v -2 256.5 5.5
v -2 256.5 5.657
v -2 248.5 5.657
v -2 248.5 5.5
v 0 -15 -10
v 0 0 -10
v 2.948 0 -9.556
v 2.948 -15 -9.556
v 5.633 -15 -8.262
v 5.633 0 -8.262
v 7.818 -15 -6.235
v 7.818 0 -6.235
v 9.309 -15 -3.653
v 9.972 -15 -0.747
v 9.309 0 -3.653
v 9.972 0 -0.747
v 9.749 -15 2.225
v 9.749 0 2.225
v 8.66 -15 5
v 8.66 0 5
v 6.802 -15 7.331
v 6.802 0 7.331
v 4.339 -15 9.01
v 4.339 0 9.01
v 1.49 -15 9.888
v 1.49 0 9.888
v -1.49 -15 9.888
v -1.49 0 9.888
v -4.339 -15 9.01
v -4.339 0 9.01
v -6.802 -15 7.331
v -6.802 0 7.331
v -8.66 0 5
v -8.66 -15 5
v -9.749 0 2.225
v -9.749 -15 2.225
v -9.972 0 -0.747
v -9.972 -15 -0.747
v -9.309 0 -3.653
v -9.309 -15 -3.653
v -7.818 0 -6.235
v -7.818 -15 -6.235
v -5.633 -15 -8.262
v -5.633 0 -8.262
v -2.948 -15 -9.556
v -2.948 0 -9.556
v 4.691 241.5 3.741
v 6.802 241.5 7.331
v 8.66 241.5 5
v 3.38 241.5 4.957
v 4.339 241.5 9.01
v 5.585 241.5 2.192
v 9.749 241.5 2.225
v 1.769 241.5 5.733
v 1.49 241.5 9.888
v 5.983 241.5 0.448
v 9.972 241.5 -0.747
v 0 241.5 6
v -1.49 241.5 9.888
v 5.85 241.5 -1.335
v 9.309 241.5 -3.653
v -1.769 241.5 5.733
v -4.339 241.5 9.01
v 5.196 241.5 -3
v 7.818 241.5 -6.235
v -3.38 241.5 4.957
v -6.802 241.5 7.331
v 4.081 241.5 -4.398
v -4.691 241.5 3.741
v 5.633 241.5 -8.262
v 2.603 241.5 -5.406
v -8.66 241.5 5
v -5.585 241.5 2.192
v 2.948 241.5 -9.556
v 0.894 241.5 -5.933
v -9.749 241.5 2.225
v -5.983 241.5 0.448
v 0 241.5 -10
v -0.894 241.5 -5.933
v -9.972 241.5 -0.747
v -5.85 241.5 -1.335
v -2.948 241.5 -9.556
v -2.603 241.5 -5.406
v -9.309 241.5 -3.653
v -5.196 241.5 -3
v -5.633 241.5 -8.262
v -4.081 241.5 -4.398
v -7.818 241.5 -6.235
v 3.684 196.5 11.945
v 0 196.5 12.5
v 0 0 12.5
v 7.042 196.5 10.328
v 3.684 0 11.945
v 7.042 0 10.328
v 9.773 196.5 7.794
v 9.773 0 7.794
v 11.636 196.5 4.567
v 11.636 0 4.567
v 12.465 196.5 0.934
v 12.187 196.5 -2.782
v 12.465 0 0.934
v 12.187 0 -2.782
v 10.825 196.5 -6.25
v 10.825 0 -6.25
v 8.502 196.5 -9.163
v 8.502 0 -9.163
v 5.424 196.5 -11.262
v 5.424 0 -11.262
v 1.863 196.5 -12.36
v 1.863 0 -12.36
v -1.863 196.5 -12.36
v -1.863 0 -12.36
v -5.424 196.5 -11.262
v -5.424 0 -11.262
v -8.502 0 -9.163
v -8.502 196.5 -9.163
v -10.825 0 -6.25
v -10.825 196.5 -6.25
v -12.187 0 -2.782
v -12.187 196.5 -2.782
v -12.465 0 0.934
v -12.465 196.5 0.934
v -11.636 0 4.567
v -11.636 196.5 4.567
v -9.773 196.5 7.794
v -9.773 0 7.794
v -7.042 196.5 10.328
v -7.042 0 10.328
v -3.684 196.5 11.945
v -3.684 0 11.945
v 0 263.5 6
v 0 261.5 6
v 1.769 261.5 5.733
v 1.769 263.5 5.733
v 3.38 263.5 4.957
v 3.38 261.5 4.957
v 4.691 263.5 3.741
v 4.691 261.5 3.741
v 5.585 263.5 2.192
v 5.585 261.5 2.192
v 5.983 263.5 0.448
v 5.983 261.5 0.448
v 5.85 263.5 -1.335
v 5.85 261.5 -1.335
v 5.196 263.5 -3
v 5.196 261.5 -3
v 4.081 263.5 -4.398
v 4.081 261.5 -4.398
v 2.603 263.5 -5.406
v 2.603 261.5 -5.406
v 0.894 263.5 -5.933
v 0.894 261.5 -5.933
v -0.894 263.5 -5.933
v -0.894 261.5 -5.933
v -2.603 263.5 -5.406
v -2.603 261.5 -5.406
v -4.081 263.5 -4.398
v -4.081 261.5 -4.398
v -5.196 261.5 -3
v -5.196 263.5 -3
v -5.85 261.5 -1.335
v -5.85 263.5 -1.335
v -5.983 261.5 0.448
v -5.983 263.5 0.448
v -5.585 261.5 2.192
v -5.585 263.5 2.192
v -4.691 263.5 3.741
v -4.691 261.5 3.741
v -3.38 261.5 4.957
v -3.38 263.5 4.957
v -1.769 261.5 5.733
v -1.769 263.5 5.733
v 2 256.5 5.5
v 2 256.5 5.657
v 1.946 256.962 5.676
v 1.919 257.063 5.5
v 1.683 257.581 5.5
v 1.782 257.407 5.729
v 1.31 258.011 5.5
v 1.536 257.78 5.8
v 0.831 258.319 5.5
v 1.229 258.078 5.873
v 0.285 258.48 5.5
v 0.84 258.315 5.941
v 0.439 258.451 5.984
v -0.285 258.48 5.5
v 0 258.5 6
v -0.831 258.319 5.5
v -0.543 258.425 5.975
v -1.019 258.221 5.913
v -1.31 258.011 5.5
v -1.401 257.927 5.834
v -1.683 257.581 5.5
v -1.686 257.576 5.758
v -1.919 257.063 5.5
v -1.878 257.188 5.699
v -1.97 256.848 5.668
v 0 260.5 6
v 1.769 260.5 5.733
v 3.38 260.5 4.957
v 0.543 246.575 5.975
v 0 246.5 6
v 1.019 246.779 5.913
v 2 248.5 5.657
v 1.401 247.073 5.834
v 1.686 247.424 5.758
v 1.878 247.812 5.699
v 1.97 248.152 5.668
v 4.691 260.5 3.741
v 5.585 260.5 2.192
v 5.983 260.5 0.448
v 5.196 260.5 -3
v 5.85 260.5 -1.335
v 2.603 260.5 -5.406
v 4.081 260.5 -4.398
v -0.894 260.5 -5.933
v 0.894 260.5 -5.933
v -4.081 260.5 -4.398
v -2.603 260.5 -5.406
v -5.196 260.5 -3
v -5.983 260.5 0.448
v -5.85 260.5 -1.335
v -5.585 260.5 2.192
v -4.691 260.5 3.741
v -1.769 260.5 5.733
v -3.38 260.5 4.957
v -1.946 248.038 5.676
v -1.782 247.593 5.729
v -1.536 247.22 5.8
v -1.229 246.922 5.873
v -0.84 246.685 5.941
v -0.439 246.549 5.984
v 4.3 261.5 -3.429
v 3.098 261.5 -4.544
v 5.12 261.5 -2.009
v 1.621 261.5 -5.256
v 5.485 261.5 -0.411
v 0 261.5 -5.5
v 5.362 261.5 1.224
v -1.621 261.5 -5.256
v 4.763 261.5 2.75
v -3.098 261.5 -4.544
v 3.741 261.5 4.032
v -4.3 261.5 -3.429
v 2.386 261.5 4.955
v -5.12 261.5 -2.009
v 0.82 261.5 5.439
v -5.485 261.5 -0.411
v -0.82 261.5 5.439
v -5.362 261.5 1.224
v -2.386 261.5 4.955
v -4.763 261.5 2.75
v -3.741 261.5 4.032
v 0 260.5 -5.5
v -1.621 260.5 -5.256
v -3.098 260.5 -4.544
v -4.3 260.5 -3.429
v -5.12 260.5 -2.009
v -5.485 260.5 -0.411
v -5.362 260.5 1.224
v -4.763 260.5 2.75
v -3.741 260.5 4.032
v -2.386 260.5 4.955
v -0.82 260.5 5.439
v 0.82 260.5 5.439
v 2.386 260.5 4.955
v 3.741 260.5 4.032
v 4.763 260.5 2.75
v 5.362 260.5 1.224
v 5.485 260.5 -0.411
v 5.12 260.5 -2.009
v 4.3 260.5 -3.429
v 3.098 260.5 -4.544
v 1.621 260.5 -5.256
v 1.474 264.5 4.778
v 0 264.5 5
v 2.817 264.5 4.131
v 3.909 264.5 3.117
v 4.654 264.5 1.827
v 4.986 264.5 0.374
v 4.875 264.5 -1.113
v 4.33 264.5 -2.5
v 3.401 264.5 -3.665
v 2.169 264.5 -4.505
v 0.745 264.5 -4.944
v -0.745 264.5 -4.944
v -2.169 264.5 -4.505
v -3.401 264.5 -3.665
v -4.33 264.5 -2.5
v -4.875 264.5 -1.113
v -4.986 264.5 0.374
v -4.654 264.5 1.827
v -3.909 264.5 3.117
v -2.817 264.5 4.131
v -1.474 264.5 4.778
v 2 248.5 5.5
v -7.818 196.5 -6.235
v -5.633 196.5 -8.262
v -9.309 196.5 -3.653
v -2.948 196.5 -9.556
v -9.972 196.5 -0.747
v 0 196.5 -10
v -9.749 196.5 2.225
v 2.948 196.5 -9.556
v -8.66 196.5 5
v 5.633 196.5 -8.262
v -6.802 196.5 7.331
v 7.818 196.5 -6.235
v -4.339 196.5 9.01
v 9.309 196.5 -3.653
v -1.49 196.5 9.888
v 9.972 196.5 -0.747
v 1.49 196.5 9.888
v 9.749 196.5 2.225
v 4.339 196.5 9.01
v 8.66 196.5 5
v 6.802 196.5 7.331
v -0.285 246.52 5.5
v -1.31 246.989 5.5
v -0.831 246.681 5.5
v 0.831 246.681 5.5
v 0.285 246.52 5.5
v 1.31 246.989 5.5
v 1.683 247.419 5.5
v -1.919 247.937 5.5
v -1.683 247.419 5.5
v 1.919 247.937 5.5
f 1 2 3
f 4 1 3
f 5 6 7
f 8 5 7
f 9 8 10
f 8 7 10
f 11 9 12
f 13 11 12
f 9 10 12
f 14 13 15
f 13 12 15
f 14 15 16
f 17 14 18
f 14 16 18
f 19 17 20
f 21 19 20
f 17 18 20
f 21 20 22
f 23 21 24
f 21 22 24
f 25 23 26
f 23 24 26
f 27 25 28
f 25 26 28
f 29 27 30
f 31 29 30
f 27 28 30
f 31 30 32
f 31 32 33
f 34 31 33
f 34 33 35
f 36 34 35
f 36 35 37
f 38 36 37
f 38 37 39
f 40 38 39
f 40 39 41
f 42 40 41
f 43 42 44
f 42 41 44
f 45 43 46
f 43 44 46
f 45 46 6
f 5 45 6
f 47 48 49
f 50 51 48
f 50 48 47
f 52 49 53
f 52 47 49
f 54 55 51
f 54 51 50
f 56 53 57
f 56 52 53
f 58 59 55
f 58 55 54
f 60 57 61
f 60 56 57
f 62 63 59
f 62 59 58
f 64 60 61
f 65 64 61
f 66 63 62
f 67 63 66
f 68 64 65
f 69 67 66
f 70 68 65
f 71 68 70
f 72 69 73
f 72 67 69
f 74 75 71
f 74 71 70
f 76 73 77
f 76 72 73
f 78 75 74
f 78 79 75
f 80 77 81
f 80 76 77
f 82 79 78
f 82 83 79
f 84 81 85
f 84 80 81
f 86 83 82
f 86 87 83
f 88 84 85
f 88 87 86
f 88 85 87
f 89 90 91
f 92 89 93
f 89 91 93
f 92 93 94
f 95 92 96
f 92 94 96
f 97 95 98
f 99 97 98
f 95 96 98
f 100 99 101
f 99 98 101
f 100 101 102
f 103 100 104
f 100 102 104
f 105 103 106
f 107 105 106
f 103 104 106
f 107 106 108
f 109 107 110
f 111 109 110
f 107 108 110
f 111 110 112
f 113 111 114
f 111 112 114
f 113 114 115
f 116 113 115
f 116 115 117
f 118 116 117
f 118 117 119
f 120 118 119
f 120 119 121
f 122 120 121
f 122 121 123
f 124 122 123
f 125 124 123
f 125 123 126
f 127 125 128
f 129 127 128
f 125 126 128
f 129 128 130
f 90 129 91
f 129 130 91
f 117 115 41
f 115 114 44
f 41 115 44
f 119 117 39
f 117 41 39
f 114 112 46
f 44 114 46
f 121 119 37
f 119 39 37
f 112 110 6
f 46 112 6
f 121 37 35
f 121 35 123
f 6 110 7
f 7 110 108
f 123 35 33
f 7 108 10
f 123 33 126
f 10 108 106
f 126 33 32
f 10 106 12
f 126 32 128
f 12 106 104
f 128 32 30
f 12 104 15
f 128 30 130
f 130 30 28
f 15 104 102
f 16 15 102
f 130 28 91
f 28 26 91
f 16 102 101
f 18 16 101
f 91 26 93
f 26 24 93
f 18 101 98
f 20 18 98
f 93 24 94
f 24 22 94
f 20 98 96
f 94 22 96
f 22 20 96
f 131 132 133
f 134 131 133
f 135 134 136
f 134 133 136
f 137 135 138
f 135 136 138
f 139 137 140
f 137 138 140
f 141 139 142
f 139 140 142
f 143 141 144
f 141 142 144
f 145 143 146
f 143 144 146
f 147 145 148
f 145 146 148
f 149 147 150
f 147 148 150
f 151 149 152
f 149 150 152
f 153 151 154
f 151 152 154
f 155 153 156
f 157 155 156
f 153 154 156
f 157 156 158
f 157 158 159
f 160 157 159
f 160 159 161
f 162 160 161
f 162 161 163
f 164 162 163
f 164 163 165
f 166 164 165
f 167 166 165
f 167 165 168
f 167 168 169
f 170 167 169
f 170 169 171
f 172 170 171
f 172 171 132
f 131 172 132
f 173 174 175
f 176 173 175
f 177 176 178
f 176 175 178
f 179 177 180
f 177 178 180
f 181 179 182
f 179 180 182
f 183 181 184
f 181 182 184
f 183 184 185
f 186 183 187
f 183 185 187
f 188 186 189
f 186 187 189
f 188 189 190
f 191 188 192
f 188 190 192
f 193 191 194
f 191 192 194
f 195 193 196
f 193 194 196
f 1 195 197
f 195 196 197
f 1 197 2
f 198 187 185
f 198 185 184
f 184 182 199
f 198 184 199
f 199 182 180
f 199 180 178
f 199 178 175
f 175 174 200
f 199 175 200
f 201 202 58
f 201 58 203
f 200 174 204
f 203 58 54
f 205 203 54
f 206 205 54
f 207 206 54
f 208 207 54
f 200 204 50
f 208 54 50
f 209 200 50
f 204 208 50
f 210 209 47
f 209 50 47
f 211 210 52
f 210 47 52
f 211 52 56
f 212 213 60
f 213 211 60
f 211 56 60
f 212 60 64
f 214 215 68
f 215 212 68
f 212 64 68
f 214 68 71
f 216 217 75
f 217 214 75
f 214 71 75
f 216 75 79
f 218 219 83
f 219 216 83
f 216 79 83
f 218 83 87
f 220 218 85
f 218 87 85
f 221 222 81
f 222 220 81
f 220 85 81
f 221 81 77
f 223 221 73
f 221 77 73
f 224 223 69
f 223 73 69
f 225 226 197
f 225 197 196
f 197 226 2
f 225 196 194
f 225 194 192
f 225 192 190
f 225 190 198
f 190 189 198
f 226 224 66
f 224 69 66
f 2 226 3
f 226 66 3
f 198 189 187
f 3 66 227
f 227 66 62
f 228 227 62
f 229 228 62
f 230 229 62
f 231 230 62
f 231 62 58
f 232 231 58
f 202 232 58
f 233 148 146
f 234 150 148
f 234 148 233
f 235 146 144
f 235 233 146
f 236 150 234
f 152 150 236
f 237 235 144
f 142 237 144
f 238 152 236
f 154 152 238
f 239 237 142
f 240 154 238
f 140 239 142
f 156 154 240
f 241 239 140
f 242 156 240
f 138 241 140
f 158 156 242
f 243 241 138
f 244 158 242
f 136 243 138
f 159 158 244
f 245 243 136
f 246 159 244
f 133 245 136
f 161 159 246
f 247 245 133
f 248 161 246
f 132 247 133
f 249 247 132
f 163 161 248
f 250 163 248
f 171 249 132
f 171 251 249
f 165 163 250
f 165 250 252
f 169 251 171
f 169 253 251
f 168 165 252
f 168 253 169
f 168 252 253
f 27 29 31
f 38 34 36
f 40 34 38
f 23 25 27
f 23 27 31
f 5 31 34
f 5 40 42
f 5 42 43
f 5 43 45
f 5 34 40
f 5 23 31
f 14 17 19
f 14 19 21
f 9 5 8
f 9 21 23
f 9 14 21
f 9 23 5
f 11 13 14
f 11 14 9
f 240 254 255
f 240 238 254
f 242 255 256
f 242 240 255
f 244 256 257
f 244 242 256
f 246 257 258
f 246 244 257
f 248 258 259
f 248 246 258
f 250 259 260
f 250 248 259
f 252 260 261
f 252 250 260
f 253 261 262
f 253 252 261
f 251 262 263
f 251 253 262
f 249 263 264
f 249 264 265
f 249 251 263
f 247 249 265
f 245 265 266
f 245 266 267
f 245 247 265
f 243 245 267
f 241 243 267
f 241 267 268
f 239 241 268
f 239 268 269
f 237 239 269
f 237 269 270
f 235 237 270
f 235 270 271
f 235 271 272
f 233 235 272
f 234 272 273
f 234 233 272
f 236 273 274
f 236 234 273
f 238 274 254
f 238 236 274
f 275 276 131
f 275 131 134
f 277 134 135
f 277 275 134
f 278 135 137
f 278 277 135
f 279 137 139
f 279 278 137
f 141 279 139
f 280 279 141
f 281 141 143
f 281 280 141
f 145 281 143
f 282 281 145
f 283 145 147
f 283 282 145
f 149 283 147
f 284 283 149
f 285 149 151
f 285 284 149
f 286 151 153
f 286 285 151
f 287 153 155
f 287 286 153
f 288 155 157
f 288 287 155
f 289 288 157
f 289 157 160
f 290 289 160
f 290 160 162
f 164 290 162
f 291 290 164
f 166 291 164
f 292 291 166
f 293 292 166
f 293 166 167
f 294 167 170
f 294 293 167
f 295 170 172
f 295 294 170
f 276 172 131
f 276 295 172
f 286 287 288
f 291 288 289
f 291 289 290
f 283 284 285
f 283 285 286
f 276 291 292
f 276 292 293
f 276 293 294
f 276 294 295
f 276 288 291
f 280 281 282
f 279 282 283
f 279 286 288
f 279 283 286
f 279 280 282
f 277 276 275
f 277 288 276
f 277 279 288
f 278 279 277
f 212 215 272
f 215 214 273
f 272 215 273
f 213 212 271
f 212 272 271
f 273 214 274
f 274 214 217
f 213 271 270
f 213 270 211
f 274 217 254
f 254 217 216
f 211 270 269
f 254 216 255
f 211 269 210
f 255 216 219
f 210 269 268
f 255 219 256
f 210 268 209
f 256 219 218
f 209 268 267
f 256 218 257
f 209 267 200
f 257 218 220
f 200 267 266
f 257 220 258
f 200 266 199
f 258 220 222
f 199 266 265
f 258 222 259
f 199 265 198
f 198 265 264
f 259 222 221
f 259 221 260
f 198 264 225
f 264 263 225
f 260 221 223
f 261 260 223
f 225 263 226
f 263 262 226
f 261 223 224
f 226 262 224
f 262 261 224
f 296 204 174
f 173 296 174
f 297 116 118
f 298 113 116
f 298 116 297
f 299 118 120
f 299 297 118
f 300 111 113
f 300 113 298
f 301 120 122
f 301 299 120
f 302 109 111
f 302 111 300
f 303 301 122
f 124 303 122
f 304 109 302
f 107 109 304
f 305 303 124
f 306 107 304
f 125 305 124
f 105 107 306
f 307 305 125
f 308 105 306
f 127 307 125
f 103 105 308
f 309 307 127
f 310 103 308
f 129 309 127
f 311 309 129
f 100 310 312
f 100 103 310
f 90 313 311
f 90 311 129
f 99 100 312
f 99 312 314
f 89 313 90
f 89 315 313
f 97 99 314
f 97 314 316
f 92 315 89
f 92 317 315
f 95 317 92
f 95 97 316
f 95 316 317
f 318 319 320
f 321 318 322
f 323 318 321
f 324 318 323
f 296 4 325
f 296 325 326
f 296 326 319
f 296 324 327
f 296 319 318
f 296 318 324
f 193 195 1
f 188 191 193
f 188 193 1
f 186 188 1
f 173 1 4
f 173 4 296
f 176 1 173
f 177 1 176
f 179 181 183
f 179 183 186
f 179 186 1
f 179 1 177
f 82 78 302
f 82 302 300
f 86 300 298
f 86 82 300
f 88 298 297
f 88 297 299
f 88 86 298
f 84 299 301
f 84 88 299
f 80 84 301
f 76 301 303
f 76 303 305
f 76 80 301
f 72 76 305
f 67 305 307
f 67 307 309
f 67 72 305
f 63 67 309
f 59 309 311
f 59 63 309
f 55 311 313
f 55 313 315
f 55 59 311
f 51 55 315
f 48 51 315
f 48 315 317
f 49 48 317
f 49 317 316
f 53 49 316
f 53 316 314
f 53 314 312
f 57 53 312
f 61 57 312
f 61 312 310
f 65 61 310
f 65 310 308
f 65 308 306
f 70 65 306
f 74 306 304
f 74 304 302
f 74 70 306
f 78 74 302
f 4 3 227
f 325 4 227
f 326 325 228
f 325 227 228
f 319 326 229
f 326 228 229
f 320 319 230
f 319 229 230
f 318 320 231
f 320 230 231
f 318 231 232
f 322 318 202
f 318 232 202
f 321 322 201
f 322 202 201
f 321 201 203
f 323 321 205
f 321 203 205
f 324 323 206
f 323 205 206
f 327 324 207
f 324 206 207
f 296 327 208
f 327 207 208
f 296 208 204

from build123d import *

# Parameters (mm, degrees)
SKETCH_1_R          = 12.5
EXTRUDE_1_DEPTH     = 196.5
SKETCH_2_R          = 10
EXTRUDE_2_DEPTH     = 15
EXTRUDE_START       = 45
SKETCH_3_R          = 10
EXTRUDE_3_DEPTH     = 45
SKETCH_4_R          = 6
EXTRUDE_4_DEPTH     = 23
CUT_EXTRUDE_1_DEPTH = 4
CHAMFER_1_SIZE      = 1
SKETCH_6_W          = 0.5
SKETCH_6_H          = 1


with BuildPart() as part:
    # 草图1 → 凸台-拉伸1 (new body)
    with BuildSketch(Plane(origin=(0, 0, 0), x_dir=(1, 0, 0), z_dir=(0, 1, 0))):
        with Locations(Location((0, 0, 0), (0, 0, 270))):
            Circle(SKETCH_1_R)
    extrude(amount=EXTRUDE_1_DEPTH)

    # 草图2 → 凸台-拉伸2 (add)
    with BuildSketch(Plane.XZ):
        with Locations(Location((0, 0, 0), (0, 0, 270))):
            Circle(SKETCH_2_R)
    extrude(amount=EXTRUDE_2_DEPTH)

    # 草图3 → 凸台-拉伸3 (add)
    with BuildSketch(Plane(origin=(0, 196.5, 0), x_dir=(1, 0, 0), z_dir=(0, 1, 0)).offset(EXTRUDE_START)):
        with Locations(Location((0, 0, 0), (0, 0, 90))):
            Circle(SKETCH_3_R)
    extrude(amount=-EXTRUDE_3_DEPTH)

    # 草图4 → 凸台-拉伸4 (add)
    with BuildSketch(Plane(origin=(0, 241.5, 0), x_dir=(1, 0, 0), z_dir=(0, 1, 0))):
        with Locations(Location((0, 0, 0), (0, 0, 270))):
            Circle(SKETCH_4_R)
    extrude(amount=EXTRUDE_4_DEPTH)

    # 草图5 → 切除-拉伸1 (cut)
    with BuildSketch(Plane(origin=(0, 0, 9.5), x_dir=(-1, 0, 0), z_dir=(0, 0, -1))):
        with BuildLine():
            Line((2, 256.5), (2, 248.5))
            ThreePointArc((2, 248.5), (0, 246.5), (-2, 248.5))
            Line((-2, 248.5), (-2, 256.5))
            ThreePointArc((-2, 256.5), (0, 258.5), (2, 256.5))
        make_face()
    extrude(amount=CUT_EXTRUDE_1_DEPTH, mode=Mode.SUBTRACT)

    # 倒角1
    chamfer_1_edges = [part.edges().sort_by_distance(p)[0] for p in [
        (0, 264.5, -6),
    ]]
    chamfer(chamfer_1_edges, length=CHAMFER_1_SIZE)

    # 草图6 → 切除-旋转1 (revolve, cut)
    with BuildSketch(Plane(origin=(0, 0, 0), x_dir=(0, 0, -1), z_dir=(1, 0, 0))):
        with Locations((5.75, 261)):
            Rectangle(SKETCH_6_W, SKETCH_6_H)
    revolve(axis=Axis((0, 264.5, 0), (0, 1, 0)), mode=Mode.SUBTRACT)


solid = part.part
